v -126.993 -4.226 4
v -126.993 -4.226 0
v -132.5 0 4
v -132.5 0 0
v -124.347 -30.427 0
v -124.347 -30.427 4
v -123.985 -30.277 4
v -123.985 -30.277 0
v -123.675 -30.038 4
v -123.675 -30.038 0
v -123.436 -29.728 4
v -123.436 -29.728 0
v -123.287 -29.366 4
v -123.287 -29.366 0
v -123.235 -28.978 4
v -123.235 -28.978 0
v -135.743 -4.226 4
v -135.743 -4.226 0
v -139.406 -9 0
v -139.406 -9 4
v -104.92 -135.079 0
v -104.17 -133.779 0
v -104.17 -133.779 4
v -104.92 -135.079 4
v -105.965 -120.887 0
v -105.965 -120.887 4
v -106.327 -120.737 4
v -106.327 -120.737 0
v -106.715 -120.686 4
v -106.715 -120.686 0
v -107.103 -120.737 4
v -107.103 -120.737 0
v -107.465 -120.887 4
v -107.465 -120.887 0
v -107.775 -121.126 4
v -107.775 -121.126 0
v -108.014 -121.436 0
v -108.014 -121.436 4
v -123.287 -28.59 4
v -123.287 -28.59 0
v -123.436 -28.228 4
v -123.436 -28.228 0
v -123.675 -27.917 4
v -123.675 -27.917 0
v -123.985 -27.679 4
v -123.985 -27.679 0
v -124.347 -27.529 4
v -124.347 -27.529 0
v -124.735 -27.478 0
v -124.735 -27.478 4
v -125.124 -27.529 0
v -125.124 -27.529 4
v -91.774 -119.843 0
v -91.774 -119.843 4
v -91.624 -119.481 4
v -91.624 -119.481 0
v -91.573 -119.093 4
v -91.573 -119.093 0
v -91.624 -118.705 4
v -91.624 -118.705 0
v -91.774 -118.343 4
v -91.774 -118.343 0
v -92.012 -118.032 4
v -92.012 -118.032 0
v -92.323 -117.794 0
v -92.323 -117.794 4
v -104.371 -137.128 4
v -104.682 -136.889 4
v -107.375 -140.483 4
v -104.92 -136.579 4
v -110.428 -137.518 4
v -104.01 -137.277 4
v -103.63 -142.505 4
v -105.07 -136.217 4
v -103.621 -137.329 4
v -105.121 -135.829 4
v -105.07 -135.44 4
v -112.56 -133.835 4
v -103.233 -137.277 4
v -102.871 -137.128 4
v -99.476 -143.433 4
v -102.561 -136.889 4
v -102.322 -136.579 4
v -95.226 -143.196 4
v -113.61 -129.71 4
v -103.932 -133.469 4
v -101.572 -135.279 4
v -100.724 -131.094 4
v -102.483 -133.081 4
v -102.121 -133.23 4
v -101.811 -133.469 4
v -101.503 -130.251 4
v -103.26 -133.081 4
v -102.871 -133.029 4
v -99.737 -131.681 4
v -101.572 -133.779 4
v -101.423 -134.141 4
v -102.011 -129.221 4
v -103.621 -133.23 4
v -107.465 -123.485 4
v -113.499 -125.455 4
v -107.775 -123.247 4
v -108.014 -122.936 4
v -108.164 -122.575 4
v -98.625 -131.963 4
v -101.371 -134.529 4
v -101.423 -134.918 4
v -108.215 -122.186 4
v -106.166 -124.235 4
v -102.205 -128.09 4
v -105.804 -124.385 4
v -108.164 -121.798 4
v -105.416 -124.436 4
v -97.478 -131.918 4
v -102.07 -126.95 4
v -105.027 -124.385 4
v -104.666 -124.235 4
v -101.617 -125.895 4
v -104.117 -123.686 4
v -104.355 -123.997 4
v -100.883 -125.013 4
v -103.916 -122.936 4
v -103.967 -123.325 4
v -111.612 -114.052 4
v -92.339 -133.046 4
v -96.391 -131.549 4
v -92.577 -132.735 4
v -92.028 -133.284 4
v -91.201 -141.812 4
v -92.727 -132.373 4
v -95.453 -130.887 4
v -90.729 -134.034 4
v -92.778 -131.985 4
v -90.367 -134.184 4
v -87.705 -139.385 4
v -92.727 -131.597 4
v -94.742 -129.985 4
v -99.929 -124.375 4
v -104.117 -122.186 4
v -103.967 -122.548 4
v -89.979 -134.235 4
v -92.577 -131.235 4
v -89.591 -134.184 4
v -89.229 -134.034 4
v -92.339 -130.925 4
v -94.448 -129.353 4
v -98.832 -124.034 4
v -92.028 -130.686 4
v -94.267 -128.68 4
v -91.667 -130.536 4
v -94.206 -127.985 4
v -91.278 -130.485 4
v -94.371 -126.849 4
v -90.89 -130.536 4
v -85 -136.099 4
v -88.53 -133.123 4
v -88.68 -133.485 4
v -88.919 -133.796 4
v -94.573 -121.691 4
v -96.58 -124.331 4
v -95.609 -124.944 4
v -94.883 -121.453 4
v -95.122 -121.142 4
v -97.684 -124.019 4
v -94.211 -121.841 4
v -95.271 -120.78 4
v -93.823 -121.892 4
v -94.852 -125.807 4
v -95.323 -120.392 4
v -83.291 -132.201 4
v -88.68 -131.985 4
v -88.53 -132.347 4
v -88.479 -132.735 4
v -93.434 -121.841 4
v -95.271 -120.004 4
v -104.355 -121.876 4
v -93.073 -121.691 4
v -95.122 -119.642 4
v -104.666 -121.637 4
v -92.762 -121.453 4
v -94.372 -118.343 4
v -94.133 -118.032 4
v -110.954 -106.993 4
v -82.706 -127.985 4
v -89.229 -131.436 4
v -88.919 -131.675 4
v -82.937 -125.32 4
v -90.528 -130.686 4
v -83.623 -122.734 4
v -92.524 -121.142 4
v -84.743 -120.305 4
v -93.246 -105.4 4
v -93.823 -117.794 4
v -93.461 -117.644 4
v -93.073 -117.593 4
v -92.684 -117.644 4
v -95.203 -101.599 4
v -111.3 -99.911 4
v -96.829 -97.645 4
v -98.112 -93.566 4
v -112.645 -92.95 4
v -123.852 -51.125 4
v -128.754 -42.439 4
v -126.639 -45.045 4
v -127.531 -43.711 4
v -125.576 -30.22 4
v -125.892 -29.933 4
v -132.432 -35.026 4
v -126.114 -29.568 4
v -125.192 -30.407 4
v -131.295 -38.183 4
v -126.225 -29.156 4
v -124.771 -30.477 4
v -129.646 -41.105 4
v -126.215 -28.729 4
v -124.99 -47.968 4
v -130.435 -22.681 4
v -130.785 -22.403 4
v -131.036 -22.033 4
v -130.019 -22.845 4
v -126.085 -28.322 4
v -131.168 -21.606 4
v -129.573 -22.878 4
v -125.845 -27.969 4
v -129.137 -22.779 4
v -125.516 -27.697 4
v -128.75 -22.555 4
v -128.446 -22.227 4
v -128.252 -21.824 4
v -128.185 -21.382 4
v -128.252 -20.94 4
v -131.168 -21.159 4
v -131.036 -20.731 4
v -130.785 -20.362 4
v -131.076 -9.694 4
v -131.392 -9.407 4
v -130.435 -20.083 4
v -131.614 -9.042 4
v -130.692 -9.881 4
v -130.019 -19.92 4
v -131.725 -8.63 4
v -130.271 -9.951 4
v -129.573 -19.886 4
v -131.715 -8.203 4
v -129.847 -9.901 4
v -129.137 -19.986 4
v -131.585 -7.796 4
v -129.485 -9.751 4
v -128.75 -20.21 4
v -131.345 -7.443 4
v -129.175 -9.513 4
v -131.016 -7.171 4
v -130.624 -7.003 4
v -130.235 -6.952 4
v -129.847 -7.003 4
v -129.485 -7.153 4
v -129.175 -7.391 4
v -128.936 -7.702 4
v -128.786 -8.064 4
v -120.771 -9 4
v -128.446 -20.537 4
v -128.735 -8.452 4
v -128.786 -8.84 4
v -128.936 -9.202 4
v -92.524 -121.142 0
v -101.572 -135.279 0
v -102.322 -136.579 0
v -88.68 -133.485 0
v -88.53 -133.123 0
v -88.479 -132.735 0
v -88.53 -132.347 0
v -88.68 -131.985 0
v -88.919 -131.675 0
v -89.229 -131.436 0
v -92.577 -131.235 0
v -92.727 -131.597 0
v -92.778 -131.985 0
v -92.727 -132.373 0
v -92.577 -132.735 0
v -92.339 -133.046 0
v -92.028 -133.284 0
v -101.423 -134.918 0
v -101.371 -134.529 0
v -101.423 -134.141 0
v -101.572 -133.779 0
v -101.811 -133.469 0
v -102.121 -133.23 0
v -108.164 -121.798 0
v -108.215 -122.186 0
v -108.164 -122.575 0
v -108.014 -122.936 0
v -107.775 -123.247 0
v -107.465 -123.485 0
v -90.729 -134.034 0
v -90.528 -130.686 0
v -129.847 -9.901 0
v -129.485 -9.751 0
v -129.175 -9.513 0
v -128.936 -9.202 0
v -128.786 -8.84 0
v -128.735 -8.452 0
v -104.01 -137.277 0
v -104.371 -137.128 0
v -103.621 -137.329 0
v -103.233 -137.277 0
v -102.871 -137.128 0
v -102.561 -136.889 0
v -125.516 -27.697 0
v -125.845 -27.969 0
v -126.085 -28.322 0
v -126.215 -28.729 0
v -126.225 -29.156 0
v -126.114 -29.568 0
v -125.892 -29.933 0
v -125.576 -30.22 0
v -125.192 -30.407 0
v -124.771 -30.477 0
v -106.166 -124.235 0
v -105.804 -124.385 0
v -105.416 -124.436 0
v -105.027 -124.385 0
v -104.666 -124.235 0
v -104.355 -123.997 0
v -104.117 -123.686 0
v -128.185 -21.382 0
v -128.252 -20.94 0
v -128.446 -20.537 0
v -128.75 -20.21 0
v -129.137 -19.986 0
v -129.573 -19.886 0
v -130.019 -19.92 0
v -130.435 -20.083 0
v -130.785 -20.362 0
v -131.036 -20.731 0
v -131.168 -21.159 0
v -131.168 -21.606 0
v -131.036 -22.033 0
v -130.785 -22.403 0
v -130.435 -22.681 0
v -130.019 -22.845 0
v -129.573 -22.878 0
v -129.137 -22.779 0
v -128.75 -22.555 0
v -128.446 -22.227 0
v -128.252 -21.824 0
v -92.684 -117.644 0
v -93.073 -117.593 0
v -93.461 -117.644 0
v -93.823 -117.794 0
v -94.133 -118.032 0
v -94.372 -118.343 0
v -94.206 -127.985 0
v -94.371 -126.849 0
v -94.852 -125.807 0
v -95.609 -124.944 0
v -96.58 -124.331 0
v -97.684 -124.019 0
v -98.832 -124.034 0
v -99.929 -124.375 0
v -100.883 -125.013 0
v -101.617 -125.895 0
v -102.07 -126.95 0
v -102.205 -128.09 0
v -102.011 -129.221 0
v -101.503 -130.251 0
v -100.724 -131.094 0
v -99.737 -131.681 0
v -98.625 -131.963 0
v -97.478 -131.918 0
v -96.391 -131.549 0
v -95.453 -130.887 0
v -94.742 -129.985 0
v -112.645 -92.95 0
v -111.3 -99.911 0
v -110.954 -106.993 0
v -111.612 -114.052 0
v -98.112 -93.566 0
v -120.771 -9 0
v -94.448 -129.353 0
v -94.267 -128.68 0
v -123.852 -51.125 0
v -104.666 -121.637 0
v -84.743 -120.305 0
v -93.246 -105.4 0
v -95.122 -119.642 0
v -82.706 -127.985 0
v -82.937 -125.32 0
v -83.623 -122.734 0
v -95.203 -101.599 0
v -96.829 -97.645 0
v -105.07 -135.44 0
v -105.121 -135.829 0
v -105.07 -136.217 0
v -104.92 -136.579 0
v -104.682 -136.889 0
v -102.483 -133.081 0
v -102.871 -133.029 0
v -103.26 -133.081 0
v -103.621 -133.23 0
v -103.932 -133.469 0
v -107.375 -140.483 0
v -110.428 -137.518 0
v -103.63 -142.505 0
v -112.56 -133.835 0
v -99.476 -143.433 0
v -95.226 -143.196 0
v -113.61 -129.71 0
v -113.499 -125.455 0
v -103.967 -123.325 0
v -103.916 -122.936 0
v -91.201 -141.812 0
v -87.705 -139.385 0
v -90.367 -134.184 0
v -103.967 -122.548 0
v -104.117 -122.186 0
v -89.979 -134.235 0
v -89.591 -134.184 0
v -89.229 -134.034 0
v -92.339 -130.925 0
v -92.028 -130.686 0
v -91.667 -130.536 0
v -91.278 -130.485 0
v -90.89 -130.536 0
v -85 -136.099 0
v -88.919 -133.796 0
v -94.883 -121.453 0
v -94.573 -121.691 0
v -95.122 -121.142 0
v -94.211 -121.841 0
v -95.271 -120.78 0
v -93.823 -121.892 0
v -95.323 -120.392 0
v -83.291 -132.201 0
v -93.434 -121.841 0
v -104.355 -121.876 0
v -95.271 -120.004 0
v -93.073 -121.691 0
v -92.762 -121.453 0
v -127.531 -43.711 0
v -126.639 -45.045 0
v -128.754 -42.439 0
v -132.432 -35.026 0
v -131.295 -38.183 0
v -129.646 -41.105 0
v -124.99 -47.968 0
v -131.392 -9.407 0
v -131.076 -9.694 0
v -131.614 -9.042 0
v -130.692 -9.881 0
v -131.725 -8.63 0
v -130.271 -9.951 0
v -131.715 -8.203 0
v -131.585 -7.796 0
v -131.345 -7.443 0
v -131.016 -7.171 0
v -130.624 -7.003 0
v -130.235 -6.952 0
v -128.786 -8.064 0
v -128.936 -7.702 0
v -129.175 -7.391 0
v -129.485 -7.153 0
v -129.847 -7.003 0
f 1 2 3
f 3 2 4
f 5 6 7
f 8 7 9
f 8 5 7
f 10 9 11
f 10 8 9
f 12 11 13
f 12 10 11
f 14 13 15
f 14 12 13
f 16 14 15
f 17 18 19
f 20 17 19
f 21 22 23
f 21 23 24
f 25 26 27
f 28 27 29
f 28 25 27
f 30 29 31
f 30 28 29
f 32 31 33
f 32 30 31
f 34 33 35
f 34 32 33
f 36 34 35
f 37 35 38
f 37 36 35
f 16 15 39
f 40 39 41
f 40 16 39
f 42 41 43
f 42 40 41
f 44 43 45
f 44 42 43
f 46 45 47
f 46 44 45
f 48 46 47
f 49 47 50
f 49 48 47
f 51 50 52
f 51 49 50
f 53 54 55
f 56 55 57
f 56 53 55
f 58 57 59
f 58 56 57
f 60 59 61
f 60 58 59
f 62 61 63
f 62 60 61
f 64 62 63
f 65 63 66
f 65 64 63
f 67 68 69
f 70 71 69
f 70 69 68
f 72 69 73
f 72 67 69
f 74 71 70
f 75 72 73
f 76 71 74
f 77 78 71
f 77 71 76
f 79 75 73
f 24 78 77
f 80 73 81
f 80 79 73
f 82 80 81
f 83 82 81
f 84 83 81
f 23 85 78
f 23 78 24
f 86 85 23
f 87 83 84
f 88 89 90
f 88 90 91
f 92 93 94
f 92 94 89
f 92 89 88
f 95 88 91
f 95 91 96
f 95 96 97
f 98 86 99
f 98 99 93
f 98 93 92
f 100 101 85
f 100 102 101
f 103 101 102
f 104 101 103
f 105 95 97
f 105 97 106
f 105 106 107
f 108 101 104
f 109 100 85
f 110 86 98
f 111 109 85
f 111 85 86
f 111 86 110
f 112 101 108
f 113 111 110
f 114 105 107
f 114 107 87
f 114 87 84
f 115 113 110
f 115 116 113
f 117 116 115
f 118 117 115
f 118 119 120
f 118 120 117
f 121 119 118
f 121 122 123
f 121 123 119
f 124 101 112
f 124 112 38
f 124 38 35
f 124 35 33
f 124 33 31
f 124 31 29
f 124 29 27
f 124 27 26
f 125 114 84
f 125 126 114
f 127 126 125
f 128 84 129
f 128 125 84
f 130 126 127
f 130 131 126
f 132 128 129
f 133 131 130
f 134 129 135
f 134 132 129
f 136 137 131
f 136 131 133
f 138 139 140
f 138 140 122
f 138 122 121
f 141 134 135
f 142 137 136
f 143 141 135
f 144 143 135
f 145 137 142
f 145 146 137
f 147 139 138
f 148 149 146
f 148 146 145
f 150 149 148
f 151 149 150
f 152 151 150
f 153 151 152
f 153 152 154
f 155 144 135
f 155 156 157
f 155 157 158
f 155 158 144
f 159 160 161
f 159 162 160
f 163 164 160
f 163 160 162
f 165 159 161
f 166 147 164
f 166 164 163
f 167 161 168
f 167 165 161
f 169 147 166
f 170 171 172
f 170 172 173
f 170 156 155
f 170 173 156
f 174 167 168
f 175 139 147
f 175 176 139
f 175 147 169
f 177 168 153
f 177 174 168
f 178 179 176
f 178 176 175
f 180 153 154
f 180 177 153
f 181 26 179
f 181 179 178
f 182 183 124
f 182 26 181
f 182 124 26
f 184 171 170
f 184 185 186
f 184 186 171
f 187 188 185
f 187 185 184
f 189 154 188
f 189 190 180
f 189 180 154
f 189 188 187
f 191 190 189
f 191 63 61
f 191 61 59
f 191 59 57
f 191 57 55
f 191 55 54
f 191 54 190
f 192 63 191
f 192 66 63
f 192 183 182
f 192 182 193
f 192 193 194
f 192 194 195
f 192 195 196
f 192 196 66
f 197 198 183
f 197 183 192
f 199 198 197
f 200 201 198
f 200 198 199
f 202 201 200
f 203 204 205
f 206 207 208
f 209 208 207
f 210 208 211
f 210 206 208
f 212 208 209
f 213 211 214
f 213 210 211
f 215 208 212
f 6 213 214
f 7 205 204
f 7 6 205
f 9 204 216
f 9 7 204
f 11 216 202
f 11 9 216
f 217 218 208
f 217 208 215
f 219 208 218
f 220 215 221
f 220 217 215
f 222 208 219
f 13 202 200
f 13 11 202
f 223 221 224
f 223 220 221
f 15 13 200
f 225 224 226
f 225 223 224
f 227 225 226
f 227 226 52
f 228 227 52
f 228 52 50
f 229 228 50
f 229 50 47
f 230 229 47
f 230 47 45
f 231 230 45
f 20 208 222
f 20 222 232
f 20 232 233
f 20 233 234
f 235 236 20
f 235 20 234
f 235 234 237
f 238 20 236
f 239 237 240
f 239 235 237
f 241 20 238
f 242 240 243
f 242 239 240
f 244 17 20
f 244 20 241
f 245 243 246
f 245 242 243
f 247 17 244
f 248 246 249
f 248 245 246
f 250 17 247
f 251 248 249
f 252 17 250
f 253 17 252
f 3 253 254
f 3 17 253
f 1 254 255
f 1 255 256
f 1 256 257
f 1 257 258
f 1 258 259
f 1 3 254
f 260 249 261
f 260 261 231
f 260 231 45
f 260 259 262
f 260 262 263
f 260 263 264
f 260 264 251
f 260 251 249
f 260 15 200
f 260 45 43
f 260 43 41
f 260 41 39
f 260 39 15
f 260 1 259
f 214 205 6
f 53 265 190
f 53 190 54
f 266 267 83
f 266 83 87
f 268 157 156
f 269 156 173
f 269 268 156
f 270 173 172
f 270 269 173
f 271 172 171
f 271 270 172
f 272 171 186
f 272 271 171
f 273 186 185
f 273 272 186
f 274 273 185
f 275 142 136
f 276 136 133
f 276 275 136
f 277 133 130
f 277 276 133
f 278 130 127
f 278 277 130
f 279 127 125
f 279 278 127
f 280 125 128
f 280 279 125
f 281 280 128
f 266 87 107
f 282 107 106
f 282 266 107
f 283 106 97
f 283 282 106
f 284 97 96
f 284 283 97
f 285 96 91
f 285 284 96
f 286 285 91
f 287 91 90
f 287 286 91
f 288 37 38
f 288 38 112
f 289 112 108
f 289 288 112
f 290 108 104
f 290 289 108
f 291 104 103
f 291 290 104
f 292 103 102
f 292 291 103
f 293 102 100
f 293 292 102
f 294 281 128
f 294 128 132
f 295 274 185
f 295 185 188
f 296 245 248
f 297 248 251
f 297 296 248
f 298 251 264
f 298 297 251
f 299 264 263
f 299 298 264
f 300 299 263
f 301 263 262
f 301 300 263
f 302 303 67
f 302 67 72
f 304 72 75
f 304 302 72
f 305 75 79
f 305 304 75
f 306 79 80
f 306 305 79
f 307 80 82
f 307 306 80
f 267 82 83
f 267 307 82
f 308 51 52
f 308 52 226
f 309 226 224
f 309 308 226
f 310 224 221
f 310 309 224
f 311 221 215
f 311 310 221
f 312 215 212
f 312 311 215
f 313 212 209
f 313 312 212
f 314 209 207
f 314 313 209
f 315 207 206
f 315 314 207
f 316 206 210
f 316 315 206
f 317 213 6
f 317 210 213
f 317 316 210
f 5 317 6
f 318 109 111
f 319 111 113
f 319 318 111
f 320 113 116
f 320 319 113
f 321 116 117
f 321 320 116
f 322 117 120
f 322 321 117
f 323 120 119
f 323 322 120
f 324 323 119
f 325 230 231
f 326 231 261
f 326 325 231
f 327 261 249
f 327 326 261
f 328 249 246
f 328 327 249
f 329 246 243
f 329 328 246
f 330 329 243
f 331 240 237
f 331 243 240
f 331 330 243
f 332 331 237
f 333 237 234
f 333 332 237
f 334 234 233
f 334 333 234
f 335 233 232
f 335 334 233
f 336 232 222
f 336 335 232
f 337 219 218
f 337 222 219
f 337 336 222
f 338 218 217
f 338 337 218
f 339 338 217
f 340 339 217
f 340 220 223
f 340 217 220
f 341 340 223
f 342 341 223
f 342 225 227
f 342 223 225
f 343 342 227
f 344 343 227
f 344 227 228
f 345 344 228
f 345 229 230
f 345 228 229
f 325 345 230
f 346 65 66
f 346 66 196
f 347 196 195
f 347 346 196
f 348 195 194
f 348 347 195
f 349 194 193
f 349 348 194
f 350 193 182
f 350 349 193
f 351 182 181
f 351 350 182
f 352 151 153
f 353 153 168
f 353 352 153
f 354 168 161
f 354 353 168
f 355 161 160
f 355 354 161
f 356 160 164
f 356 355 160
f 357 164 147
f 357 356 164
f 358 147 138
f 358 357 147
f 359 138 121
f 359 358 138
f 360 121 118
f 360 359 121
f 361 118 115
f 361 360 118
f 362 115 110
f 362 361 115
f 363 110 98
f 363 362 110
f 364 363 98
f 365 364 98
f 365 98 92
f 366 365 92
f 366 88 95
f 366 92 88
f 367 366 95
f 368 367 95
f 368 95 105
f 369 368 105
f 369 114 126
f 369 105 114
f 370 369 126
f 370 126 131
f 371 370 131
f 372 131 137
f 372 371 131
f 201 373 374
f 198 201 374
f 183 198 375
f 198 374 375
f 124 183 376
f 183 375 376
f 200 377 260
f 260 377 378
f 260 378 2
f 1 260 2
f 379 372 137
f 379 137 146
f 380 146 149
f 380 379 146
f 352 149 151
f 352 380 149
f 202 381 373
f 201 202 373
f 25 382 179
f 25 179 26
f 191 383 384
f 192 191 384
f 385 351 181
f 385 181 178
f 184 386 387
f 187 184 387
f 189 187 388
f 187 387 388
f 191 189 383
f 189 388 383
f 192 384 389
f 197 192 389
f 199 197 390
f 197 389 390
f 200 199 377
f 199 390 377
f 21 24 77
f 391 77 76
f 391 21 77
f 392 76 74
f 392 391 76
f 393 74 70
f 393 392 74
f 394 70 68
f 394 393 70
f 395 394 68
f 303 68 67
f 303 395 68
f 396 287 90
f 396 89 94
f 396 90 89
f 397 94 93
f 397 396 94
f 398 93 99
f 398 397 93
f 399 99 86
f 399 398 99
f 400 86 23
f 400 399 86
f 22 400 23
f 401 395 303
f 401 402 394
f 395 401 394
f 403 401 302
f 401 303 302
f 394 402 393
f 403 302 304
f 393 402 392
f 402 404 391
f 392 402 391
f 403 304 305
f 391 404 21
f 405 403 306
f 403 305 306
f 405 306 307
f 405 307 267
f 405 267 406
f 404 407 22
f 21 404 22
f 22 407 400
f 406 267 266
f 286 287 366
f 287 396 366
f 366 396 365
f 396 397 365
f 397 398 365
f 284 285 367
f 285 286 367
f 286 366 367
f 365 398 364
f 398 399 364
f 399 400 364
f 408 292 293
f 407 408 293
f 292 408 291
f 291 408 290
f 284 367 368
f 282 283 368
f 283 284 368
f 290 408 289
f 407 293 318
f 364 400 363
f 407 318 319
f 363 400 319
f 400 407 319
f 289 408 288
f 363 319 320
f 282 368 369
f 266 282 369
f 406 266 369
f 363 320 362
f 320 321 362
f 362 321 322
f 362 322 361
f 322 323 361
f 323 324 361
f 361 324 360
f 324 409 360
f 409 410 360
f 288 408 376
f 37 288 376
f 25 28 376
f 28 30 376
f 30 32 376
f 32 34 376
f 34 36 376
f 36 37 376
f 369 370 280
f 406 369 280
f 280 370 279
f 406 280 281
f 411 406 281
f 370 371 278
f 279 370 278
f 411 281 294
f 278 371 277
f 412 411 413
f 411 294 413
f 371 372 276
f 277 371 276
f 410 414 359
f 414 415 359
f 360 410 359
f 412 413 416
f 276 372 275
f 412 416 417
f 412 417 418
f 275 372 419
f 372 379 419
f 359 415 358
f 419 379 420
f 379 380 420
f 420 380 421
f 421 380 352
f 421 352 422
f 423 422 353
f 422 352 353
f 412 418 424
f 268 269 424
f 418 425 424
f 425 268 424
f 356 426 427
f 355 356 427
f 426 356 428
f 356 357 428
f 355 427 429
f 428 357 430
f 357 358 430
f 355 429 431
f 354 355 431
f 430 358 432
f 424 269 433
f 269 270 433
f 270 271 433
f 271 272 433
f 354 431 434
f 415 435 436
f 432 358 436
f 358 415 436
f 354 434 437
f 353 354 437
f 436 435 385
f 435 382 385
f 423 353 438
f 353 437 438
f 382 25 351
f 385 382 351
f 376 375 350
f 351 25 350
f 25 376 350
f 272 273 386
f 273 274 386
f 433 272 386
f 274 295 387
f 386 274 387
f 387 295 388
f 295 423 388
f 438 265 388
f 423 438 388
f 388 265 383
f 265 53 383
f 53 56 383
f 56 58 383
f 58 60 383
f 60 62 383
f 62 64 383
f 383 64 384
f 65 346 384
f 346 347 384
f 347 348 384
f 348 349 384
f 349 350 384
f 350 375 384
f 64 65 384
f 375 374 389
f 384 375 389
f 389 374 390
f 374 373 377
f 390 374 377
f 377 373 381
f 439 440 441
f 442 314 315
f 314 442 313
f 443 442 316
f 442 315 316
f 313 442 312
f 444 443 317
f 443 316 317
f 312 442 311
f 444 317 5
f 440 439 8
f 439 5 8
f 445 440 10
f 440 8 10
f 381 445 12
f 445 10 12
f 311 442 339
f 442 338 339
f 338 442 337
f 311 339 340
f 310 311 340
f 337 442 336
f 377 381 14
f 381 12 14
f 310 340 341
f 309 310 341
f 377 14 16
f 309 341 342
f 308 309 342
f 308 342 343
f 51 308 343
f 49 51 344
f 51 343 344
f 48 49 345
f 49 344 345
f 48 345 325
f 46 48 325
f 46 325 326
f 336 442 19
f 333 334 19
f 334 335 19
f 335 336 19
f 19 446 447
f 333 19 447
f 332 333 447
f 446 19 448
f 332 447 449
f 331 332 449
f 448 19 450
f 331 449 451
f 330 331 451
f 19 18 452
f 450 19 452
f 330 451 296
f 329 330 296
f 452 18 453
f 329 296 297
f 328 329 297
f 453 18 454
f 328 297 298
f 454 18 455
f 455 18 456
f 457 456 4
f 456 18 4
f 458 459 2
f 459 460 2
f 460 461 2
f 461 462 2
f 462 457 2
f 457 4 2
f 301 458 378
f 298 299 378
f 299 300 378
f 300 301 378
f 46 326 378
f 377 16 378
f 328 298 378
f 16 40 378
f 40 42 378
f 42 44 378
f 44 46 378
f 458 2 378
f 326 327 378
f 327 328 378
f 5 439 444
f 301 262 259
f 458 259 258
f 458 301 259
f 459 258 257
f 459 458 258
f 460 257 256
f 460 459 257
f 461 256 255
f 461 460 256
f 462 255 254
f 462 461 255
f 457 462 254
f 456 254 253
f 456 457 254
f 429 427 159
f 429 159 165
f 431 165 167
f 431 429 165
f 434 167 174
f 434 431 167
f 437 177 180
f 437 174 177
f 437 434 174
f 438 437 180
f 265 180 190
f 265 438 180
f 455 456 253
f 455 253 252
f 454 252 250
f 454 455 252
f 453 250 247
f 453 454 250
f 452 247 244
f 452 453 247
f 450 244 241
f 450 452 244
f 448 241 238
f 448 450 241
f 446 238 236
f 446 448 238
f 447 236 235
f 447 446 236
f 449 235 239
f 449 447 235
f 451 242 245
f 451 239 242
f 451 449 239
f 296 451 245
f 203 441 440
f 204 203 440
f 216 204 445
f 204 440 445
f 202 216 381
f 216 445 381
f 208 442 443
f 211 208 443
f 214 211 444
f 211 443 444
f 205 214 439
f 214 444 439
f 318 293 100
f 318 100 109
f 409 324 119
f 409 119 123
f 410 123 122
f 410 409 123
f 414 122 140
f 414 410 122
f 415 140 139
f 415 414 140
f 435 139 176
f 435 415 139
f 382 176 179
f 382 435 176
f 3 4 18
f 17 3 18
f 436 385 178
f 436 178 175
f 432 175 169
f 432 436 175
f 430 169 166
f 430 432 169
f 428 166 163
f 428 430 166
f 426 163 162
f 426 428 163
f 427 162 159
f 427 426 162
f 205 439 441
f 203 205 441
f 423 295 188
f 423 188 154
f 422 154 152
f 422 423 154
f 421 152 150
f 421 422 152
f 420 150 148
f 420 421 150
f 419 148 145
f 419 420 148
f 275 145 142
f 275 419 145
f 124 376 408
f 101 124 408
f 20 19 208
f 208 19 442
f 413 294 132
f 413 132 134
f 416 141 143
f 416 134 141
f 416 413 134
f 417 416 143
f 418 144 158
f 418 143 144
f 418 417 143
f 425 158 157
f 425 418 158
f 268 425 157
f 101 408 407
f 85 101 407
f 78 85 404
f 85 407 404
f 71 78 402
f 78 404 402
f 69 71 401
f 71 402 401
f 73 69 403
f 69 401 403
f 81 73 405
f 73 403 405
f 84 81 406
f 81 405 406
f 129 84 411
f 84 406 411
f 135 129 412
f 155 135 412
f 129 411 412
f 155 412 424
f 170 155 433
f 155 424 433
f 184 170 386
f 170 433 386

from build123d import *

# Parameters (mm, degrees)
F4_DEPTH = 4
F2_R     = 1.5
F5_DEPTH = 25


with BuildPart() as f4:
    # F3 (on Top) → F4 (new body)
    with BuildSketch(Plane.XY):
        with BuildLine():
            Line((-126.9926666777, -4.22592549), (-132.5, 0))
            Line((-132.5, 0), (-135.7426666777, -4.22592549))
            Line((-135.7426666777, -4.22592549), (-139.4059428918, -9))
            Line((-139.4059428918, -9), (-132.4324272279, -35.0255147652))
            ThreePointArc((-132.4324272279, -35.0255147652), (-130.5316607318, -39.6787820716), (-127.530710333, -43.7111643205))
            Line((-127.530710333, -43.7111643205), (-128.7537766971, -42.4391498951))
            ThreePointArc((-128.7537766971, -42.4391498951), (-125.7528262983, -46.4715321441), (-123.8520598023, -51.1247994505))
            Line((-123.8520598023, -51.1247994505), (-112.6451262464, -92.9496448783))
            ThreePointArc((-112.6451262464, -92.9496448783), (-111.0012337894, -103.4455930684), (-111.6119870301, -114.0519256721))
            Line((-111.6119870301, -114.0519256721), (-113.4985999884, -125.4551601363))
            ThreePointArc((-113.4985999884, -125.4551601363), (-100.9391467421, -112.7279601319), (-84.7430925287, -120.3048535396))
            Line((-84.7430925287, -120.3048535396), (-93.2455614317, -105.4002627224))
            ThreePointArc((-93.2455614317, -105.4002627224), (-96.0587011908, -99.6394303241), (-98.1115817937, -93.5659941915))
            Line((-98.1115817937, -93.5659941915), (-120.7709716444, -9))
            Line((-120.7709716444, -9), (-126.9926666777, -4.22592549))
        make_face()
        with BuildLine():
            ThreePointArc((-82.7064765239, -127.9851719833), (-83.2242795567, -124.0122921667), (-84.7430925287, -120.3048535396))
            ThreePointArc((-84.7430925287, -120.3048535396), (-100.9391467421, -112.7279601319), (-113.4985999884, -125.4551601363))
            ThreePointArc((-113.4985999884, -125.4551601363), (-99.4757452701, -143.4331154338), (-82.7064765239, -127.9851719833))
        make_face()
    extrude(amount=F4_DEPTH)

    # F0 (on Top) + F1 (on Top) + F2 (on Top) → F5 (cut)
    with BuildSketch(Plane.XY):
        with BuildLine():
            ThreePointArc((-101.5723892492, -135.2794656723), (-101.4225386155, -134.1412371047), (-102.1214273549, -133.2304275666))
            ThreePointArc((-102.1214273549, -133.2304275666), (-103.2596559226, -133.0805769329), (-104.1704654606, -133.7794656723))
            Line((-104.1704654606, -133.7794656723), (-104.9204654606, -135.078503778))
            ThreePointArc((-104.9204654606, -135.078503778), (-105.0703160943, -136.2167323456), (-104.3714273549, -137.1275418837))
            ThreePointArc((-104.3714273549, -137.1275418837), (-103.2331987872, -137.2773925174), (-102.3223892492, -136.578503778))
            Line((-102.3223892492, -136.578503778), (-101.5723892492, -135.2794656723))
        make_face()
        with BuildLine():
            ThreePointArc((-94.7423749088, -129.9851719833), (-94.3427732188, -129.0204481637), (-94.2064765239, -127.9851719833))
            ThreePointArc((-94.2064765239, -127.9851719833), (-102.0701798291, -126.9498958029), (-94.7423749088, -129.9851719833))
        make_face()
        with BuildLine():
            Line((-107.4647591496, -123.4853497167), (-106.1657210439, -124.2353497167))
            ThreePointArc((-106.1657210439, -124.2353497167), (-105.0274924763, -124.3852003505), (-104.1166829382, -123.6863116111))
            ThreePointArc((-104.1166829382, -123.6863116111), (-103.9668323045, -122.5480830434), (-104.6657210439, -121.6372735054))
            Line((-104.6657210439, -121.6372735054), (-105.9647591496, -120.8872735054))
            ThreePointArc((-105.9647591496, -120.8872735054), (-107.1029877172, -120.7374228716), (-108.0137972553, -121.4363116111))
            ThreePointArc((-108.0137972553, -121.4363116111), (-108.163647889, -122.5745401787), (-107.4647591496, -123.4853497167))
        make_face()
        with BuildLine():
            Line((-92.523528877, -121.142017922), (-91.773528877, -119.8429798164))
            ThreePointArc((-91.773528877, -119.8429798164), (-91.6236782432, -118.7047512487), (-92.3225669827, -117.7939417107))
            ThreePointArc((-92.3225669827, -117.7939417107), (-93.4607955503, -117.6440910769), (-94.3716050883, -118.3429798164))
            Line((-94.3716050883, -118.3429798164), (-95.1216050883, -119.642017922))
            ThreePointArc((-95.1216050883, -119.642017922), (-95.2714557221, -120.7802464897), (-94.5725669827, -121.6910560277))
            ThreePointArc((-94.5725669827, -121.6910560277), (-93.434338415, -121.8409066615), (-92.523528877, -121.142017922))
        make_face()
        with BuildLine():
            ThreePointArc((-90.5282732936, -130.6861338776), (-91.6665018613, -130.5362832439), (-92.5773113993, -131.2351719833))
            ThreePointArc((-92.5773113993, -131.2351719833), (-92.7271620331, -132.373400551), (-92.0282732936, -133.284210089))
            Line((-92.0282732936, -133.284210089), (-90.729235188, -134.034210089))
            ThreePointArc((-90.729235188, -134.034210089), (-89.5910066203, -134.1840607227), (-88.6801970823, -133.4851719833))
            ThreePointArc((-88.6801970823, -133.4851719833), (-88.5303464485, -132.3469434156), (-89.229235188, -131.4361338776))
            Line((-89.229235188, -131.4361338776), (-90.5282732936, -130.6861338776))
        make_face()
    with BuildSketch(Plane.XY):
        with BuildLine():
            ThreePointArc((-123.2354286469, -28.9777747887), (-123.8222865034, -27.7877447782), (-125.1236572146, -27.5288860492))
            Line((-125.1236572146, -27.5288860492), (-124.3472000793, -30.4266635281))
            ThreePointArc((-124.3472000793, -30.4266635281), (-123.5453986365, -29.8909169322), (-123.2354286469, -28.9777747887))
        make_face()
        with BuildLine():
            Line((-124.3472000793, -30.4266635281), (-125.1236572146, -27.5288860492))
            ThreePointArc((-125.1236572146, -27.5288860492), (-126.1843173864, -29.3660033563), (-124.3472000793, -30.4266635281))
        make_face()
        with BuildLine():
            ThreePointArc((-128.7353333554, -8.45185098), (-129.3221912118, -7.2618209696), (-130.623561923, -7.0029622406))
            Line((-130.623561923, -7.0029622406), (-129.8471047877, -9.9007397195))
            ThreePointArc((-129.8471047877, -9.9007397195), (-129.0453033449, -9.3649931235), (-128.7353333554, -8.45185098))
        make_face()
        with BuildLine():
            Line((-129.8471047877, -9.9007397195), (-130.623561923, -7.0029622406))
            ThreePointArc((-130.623561923, -7.0029622406), (-131.6842220948, -8.8400795477), (-129.8471047877, -9.9007397195))
        make_face()
    with BuildSketch(Plane.XY):
        with Locations((-129.6849733529, -21.3822502318)):
            Circle(F2_R)
    extrude(amount=F5_DEPTH, mode=Mode.SUBTRACT)


solid = f4.part
